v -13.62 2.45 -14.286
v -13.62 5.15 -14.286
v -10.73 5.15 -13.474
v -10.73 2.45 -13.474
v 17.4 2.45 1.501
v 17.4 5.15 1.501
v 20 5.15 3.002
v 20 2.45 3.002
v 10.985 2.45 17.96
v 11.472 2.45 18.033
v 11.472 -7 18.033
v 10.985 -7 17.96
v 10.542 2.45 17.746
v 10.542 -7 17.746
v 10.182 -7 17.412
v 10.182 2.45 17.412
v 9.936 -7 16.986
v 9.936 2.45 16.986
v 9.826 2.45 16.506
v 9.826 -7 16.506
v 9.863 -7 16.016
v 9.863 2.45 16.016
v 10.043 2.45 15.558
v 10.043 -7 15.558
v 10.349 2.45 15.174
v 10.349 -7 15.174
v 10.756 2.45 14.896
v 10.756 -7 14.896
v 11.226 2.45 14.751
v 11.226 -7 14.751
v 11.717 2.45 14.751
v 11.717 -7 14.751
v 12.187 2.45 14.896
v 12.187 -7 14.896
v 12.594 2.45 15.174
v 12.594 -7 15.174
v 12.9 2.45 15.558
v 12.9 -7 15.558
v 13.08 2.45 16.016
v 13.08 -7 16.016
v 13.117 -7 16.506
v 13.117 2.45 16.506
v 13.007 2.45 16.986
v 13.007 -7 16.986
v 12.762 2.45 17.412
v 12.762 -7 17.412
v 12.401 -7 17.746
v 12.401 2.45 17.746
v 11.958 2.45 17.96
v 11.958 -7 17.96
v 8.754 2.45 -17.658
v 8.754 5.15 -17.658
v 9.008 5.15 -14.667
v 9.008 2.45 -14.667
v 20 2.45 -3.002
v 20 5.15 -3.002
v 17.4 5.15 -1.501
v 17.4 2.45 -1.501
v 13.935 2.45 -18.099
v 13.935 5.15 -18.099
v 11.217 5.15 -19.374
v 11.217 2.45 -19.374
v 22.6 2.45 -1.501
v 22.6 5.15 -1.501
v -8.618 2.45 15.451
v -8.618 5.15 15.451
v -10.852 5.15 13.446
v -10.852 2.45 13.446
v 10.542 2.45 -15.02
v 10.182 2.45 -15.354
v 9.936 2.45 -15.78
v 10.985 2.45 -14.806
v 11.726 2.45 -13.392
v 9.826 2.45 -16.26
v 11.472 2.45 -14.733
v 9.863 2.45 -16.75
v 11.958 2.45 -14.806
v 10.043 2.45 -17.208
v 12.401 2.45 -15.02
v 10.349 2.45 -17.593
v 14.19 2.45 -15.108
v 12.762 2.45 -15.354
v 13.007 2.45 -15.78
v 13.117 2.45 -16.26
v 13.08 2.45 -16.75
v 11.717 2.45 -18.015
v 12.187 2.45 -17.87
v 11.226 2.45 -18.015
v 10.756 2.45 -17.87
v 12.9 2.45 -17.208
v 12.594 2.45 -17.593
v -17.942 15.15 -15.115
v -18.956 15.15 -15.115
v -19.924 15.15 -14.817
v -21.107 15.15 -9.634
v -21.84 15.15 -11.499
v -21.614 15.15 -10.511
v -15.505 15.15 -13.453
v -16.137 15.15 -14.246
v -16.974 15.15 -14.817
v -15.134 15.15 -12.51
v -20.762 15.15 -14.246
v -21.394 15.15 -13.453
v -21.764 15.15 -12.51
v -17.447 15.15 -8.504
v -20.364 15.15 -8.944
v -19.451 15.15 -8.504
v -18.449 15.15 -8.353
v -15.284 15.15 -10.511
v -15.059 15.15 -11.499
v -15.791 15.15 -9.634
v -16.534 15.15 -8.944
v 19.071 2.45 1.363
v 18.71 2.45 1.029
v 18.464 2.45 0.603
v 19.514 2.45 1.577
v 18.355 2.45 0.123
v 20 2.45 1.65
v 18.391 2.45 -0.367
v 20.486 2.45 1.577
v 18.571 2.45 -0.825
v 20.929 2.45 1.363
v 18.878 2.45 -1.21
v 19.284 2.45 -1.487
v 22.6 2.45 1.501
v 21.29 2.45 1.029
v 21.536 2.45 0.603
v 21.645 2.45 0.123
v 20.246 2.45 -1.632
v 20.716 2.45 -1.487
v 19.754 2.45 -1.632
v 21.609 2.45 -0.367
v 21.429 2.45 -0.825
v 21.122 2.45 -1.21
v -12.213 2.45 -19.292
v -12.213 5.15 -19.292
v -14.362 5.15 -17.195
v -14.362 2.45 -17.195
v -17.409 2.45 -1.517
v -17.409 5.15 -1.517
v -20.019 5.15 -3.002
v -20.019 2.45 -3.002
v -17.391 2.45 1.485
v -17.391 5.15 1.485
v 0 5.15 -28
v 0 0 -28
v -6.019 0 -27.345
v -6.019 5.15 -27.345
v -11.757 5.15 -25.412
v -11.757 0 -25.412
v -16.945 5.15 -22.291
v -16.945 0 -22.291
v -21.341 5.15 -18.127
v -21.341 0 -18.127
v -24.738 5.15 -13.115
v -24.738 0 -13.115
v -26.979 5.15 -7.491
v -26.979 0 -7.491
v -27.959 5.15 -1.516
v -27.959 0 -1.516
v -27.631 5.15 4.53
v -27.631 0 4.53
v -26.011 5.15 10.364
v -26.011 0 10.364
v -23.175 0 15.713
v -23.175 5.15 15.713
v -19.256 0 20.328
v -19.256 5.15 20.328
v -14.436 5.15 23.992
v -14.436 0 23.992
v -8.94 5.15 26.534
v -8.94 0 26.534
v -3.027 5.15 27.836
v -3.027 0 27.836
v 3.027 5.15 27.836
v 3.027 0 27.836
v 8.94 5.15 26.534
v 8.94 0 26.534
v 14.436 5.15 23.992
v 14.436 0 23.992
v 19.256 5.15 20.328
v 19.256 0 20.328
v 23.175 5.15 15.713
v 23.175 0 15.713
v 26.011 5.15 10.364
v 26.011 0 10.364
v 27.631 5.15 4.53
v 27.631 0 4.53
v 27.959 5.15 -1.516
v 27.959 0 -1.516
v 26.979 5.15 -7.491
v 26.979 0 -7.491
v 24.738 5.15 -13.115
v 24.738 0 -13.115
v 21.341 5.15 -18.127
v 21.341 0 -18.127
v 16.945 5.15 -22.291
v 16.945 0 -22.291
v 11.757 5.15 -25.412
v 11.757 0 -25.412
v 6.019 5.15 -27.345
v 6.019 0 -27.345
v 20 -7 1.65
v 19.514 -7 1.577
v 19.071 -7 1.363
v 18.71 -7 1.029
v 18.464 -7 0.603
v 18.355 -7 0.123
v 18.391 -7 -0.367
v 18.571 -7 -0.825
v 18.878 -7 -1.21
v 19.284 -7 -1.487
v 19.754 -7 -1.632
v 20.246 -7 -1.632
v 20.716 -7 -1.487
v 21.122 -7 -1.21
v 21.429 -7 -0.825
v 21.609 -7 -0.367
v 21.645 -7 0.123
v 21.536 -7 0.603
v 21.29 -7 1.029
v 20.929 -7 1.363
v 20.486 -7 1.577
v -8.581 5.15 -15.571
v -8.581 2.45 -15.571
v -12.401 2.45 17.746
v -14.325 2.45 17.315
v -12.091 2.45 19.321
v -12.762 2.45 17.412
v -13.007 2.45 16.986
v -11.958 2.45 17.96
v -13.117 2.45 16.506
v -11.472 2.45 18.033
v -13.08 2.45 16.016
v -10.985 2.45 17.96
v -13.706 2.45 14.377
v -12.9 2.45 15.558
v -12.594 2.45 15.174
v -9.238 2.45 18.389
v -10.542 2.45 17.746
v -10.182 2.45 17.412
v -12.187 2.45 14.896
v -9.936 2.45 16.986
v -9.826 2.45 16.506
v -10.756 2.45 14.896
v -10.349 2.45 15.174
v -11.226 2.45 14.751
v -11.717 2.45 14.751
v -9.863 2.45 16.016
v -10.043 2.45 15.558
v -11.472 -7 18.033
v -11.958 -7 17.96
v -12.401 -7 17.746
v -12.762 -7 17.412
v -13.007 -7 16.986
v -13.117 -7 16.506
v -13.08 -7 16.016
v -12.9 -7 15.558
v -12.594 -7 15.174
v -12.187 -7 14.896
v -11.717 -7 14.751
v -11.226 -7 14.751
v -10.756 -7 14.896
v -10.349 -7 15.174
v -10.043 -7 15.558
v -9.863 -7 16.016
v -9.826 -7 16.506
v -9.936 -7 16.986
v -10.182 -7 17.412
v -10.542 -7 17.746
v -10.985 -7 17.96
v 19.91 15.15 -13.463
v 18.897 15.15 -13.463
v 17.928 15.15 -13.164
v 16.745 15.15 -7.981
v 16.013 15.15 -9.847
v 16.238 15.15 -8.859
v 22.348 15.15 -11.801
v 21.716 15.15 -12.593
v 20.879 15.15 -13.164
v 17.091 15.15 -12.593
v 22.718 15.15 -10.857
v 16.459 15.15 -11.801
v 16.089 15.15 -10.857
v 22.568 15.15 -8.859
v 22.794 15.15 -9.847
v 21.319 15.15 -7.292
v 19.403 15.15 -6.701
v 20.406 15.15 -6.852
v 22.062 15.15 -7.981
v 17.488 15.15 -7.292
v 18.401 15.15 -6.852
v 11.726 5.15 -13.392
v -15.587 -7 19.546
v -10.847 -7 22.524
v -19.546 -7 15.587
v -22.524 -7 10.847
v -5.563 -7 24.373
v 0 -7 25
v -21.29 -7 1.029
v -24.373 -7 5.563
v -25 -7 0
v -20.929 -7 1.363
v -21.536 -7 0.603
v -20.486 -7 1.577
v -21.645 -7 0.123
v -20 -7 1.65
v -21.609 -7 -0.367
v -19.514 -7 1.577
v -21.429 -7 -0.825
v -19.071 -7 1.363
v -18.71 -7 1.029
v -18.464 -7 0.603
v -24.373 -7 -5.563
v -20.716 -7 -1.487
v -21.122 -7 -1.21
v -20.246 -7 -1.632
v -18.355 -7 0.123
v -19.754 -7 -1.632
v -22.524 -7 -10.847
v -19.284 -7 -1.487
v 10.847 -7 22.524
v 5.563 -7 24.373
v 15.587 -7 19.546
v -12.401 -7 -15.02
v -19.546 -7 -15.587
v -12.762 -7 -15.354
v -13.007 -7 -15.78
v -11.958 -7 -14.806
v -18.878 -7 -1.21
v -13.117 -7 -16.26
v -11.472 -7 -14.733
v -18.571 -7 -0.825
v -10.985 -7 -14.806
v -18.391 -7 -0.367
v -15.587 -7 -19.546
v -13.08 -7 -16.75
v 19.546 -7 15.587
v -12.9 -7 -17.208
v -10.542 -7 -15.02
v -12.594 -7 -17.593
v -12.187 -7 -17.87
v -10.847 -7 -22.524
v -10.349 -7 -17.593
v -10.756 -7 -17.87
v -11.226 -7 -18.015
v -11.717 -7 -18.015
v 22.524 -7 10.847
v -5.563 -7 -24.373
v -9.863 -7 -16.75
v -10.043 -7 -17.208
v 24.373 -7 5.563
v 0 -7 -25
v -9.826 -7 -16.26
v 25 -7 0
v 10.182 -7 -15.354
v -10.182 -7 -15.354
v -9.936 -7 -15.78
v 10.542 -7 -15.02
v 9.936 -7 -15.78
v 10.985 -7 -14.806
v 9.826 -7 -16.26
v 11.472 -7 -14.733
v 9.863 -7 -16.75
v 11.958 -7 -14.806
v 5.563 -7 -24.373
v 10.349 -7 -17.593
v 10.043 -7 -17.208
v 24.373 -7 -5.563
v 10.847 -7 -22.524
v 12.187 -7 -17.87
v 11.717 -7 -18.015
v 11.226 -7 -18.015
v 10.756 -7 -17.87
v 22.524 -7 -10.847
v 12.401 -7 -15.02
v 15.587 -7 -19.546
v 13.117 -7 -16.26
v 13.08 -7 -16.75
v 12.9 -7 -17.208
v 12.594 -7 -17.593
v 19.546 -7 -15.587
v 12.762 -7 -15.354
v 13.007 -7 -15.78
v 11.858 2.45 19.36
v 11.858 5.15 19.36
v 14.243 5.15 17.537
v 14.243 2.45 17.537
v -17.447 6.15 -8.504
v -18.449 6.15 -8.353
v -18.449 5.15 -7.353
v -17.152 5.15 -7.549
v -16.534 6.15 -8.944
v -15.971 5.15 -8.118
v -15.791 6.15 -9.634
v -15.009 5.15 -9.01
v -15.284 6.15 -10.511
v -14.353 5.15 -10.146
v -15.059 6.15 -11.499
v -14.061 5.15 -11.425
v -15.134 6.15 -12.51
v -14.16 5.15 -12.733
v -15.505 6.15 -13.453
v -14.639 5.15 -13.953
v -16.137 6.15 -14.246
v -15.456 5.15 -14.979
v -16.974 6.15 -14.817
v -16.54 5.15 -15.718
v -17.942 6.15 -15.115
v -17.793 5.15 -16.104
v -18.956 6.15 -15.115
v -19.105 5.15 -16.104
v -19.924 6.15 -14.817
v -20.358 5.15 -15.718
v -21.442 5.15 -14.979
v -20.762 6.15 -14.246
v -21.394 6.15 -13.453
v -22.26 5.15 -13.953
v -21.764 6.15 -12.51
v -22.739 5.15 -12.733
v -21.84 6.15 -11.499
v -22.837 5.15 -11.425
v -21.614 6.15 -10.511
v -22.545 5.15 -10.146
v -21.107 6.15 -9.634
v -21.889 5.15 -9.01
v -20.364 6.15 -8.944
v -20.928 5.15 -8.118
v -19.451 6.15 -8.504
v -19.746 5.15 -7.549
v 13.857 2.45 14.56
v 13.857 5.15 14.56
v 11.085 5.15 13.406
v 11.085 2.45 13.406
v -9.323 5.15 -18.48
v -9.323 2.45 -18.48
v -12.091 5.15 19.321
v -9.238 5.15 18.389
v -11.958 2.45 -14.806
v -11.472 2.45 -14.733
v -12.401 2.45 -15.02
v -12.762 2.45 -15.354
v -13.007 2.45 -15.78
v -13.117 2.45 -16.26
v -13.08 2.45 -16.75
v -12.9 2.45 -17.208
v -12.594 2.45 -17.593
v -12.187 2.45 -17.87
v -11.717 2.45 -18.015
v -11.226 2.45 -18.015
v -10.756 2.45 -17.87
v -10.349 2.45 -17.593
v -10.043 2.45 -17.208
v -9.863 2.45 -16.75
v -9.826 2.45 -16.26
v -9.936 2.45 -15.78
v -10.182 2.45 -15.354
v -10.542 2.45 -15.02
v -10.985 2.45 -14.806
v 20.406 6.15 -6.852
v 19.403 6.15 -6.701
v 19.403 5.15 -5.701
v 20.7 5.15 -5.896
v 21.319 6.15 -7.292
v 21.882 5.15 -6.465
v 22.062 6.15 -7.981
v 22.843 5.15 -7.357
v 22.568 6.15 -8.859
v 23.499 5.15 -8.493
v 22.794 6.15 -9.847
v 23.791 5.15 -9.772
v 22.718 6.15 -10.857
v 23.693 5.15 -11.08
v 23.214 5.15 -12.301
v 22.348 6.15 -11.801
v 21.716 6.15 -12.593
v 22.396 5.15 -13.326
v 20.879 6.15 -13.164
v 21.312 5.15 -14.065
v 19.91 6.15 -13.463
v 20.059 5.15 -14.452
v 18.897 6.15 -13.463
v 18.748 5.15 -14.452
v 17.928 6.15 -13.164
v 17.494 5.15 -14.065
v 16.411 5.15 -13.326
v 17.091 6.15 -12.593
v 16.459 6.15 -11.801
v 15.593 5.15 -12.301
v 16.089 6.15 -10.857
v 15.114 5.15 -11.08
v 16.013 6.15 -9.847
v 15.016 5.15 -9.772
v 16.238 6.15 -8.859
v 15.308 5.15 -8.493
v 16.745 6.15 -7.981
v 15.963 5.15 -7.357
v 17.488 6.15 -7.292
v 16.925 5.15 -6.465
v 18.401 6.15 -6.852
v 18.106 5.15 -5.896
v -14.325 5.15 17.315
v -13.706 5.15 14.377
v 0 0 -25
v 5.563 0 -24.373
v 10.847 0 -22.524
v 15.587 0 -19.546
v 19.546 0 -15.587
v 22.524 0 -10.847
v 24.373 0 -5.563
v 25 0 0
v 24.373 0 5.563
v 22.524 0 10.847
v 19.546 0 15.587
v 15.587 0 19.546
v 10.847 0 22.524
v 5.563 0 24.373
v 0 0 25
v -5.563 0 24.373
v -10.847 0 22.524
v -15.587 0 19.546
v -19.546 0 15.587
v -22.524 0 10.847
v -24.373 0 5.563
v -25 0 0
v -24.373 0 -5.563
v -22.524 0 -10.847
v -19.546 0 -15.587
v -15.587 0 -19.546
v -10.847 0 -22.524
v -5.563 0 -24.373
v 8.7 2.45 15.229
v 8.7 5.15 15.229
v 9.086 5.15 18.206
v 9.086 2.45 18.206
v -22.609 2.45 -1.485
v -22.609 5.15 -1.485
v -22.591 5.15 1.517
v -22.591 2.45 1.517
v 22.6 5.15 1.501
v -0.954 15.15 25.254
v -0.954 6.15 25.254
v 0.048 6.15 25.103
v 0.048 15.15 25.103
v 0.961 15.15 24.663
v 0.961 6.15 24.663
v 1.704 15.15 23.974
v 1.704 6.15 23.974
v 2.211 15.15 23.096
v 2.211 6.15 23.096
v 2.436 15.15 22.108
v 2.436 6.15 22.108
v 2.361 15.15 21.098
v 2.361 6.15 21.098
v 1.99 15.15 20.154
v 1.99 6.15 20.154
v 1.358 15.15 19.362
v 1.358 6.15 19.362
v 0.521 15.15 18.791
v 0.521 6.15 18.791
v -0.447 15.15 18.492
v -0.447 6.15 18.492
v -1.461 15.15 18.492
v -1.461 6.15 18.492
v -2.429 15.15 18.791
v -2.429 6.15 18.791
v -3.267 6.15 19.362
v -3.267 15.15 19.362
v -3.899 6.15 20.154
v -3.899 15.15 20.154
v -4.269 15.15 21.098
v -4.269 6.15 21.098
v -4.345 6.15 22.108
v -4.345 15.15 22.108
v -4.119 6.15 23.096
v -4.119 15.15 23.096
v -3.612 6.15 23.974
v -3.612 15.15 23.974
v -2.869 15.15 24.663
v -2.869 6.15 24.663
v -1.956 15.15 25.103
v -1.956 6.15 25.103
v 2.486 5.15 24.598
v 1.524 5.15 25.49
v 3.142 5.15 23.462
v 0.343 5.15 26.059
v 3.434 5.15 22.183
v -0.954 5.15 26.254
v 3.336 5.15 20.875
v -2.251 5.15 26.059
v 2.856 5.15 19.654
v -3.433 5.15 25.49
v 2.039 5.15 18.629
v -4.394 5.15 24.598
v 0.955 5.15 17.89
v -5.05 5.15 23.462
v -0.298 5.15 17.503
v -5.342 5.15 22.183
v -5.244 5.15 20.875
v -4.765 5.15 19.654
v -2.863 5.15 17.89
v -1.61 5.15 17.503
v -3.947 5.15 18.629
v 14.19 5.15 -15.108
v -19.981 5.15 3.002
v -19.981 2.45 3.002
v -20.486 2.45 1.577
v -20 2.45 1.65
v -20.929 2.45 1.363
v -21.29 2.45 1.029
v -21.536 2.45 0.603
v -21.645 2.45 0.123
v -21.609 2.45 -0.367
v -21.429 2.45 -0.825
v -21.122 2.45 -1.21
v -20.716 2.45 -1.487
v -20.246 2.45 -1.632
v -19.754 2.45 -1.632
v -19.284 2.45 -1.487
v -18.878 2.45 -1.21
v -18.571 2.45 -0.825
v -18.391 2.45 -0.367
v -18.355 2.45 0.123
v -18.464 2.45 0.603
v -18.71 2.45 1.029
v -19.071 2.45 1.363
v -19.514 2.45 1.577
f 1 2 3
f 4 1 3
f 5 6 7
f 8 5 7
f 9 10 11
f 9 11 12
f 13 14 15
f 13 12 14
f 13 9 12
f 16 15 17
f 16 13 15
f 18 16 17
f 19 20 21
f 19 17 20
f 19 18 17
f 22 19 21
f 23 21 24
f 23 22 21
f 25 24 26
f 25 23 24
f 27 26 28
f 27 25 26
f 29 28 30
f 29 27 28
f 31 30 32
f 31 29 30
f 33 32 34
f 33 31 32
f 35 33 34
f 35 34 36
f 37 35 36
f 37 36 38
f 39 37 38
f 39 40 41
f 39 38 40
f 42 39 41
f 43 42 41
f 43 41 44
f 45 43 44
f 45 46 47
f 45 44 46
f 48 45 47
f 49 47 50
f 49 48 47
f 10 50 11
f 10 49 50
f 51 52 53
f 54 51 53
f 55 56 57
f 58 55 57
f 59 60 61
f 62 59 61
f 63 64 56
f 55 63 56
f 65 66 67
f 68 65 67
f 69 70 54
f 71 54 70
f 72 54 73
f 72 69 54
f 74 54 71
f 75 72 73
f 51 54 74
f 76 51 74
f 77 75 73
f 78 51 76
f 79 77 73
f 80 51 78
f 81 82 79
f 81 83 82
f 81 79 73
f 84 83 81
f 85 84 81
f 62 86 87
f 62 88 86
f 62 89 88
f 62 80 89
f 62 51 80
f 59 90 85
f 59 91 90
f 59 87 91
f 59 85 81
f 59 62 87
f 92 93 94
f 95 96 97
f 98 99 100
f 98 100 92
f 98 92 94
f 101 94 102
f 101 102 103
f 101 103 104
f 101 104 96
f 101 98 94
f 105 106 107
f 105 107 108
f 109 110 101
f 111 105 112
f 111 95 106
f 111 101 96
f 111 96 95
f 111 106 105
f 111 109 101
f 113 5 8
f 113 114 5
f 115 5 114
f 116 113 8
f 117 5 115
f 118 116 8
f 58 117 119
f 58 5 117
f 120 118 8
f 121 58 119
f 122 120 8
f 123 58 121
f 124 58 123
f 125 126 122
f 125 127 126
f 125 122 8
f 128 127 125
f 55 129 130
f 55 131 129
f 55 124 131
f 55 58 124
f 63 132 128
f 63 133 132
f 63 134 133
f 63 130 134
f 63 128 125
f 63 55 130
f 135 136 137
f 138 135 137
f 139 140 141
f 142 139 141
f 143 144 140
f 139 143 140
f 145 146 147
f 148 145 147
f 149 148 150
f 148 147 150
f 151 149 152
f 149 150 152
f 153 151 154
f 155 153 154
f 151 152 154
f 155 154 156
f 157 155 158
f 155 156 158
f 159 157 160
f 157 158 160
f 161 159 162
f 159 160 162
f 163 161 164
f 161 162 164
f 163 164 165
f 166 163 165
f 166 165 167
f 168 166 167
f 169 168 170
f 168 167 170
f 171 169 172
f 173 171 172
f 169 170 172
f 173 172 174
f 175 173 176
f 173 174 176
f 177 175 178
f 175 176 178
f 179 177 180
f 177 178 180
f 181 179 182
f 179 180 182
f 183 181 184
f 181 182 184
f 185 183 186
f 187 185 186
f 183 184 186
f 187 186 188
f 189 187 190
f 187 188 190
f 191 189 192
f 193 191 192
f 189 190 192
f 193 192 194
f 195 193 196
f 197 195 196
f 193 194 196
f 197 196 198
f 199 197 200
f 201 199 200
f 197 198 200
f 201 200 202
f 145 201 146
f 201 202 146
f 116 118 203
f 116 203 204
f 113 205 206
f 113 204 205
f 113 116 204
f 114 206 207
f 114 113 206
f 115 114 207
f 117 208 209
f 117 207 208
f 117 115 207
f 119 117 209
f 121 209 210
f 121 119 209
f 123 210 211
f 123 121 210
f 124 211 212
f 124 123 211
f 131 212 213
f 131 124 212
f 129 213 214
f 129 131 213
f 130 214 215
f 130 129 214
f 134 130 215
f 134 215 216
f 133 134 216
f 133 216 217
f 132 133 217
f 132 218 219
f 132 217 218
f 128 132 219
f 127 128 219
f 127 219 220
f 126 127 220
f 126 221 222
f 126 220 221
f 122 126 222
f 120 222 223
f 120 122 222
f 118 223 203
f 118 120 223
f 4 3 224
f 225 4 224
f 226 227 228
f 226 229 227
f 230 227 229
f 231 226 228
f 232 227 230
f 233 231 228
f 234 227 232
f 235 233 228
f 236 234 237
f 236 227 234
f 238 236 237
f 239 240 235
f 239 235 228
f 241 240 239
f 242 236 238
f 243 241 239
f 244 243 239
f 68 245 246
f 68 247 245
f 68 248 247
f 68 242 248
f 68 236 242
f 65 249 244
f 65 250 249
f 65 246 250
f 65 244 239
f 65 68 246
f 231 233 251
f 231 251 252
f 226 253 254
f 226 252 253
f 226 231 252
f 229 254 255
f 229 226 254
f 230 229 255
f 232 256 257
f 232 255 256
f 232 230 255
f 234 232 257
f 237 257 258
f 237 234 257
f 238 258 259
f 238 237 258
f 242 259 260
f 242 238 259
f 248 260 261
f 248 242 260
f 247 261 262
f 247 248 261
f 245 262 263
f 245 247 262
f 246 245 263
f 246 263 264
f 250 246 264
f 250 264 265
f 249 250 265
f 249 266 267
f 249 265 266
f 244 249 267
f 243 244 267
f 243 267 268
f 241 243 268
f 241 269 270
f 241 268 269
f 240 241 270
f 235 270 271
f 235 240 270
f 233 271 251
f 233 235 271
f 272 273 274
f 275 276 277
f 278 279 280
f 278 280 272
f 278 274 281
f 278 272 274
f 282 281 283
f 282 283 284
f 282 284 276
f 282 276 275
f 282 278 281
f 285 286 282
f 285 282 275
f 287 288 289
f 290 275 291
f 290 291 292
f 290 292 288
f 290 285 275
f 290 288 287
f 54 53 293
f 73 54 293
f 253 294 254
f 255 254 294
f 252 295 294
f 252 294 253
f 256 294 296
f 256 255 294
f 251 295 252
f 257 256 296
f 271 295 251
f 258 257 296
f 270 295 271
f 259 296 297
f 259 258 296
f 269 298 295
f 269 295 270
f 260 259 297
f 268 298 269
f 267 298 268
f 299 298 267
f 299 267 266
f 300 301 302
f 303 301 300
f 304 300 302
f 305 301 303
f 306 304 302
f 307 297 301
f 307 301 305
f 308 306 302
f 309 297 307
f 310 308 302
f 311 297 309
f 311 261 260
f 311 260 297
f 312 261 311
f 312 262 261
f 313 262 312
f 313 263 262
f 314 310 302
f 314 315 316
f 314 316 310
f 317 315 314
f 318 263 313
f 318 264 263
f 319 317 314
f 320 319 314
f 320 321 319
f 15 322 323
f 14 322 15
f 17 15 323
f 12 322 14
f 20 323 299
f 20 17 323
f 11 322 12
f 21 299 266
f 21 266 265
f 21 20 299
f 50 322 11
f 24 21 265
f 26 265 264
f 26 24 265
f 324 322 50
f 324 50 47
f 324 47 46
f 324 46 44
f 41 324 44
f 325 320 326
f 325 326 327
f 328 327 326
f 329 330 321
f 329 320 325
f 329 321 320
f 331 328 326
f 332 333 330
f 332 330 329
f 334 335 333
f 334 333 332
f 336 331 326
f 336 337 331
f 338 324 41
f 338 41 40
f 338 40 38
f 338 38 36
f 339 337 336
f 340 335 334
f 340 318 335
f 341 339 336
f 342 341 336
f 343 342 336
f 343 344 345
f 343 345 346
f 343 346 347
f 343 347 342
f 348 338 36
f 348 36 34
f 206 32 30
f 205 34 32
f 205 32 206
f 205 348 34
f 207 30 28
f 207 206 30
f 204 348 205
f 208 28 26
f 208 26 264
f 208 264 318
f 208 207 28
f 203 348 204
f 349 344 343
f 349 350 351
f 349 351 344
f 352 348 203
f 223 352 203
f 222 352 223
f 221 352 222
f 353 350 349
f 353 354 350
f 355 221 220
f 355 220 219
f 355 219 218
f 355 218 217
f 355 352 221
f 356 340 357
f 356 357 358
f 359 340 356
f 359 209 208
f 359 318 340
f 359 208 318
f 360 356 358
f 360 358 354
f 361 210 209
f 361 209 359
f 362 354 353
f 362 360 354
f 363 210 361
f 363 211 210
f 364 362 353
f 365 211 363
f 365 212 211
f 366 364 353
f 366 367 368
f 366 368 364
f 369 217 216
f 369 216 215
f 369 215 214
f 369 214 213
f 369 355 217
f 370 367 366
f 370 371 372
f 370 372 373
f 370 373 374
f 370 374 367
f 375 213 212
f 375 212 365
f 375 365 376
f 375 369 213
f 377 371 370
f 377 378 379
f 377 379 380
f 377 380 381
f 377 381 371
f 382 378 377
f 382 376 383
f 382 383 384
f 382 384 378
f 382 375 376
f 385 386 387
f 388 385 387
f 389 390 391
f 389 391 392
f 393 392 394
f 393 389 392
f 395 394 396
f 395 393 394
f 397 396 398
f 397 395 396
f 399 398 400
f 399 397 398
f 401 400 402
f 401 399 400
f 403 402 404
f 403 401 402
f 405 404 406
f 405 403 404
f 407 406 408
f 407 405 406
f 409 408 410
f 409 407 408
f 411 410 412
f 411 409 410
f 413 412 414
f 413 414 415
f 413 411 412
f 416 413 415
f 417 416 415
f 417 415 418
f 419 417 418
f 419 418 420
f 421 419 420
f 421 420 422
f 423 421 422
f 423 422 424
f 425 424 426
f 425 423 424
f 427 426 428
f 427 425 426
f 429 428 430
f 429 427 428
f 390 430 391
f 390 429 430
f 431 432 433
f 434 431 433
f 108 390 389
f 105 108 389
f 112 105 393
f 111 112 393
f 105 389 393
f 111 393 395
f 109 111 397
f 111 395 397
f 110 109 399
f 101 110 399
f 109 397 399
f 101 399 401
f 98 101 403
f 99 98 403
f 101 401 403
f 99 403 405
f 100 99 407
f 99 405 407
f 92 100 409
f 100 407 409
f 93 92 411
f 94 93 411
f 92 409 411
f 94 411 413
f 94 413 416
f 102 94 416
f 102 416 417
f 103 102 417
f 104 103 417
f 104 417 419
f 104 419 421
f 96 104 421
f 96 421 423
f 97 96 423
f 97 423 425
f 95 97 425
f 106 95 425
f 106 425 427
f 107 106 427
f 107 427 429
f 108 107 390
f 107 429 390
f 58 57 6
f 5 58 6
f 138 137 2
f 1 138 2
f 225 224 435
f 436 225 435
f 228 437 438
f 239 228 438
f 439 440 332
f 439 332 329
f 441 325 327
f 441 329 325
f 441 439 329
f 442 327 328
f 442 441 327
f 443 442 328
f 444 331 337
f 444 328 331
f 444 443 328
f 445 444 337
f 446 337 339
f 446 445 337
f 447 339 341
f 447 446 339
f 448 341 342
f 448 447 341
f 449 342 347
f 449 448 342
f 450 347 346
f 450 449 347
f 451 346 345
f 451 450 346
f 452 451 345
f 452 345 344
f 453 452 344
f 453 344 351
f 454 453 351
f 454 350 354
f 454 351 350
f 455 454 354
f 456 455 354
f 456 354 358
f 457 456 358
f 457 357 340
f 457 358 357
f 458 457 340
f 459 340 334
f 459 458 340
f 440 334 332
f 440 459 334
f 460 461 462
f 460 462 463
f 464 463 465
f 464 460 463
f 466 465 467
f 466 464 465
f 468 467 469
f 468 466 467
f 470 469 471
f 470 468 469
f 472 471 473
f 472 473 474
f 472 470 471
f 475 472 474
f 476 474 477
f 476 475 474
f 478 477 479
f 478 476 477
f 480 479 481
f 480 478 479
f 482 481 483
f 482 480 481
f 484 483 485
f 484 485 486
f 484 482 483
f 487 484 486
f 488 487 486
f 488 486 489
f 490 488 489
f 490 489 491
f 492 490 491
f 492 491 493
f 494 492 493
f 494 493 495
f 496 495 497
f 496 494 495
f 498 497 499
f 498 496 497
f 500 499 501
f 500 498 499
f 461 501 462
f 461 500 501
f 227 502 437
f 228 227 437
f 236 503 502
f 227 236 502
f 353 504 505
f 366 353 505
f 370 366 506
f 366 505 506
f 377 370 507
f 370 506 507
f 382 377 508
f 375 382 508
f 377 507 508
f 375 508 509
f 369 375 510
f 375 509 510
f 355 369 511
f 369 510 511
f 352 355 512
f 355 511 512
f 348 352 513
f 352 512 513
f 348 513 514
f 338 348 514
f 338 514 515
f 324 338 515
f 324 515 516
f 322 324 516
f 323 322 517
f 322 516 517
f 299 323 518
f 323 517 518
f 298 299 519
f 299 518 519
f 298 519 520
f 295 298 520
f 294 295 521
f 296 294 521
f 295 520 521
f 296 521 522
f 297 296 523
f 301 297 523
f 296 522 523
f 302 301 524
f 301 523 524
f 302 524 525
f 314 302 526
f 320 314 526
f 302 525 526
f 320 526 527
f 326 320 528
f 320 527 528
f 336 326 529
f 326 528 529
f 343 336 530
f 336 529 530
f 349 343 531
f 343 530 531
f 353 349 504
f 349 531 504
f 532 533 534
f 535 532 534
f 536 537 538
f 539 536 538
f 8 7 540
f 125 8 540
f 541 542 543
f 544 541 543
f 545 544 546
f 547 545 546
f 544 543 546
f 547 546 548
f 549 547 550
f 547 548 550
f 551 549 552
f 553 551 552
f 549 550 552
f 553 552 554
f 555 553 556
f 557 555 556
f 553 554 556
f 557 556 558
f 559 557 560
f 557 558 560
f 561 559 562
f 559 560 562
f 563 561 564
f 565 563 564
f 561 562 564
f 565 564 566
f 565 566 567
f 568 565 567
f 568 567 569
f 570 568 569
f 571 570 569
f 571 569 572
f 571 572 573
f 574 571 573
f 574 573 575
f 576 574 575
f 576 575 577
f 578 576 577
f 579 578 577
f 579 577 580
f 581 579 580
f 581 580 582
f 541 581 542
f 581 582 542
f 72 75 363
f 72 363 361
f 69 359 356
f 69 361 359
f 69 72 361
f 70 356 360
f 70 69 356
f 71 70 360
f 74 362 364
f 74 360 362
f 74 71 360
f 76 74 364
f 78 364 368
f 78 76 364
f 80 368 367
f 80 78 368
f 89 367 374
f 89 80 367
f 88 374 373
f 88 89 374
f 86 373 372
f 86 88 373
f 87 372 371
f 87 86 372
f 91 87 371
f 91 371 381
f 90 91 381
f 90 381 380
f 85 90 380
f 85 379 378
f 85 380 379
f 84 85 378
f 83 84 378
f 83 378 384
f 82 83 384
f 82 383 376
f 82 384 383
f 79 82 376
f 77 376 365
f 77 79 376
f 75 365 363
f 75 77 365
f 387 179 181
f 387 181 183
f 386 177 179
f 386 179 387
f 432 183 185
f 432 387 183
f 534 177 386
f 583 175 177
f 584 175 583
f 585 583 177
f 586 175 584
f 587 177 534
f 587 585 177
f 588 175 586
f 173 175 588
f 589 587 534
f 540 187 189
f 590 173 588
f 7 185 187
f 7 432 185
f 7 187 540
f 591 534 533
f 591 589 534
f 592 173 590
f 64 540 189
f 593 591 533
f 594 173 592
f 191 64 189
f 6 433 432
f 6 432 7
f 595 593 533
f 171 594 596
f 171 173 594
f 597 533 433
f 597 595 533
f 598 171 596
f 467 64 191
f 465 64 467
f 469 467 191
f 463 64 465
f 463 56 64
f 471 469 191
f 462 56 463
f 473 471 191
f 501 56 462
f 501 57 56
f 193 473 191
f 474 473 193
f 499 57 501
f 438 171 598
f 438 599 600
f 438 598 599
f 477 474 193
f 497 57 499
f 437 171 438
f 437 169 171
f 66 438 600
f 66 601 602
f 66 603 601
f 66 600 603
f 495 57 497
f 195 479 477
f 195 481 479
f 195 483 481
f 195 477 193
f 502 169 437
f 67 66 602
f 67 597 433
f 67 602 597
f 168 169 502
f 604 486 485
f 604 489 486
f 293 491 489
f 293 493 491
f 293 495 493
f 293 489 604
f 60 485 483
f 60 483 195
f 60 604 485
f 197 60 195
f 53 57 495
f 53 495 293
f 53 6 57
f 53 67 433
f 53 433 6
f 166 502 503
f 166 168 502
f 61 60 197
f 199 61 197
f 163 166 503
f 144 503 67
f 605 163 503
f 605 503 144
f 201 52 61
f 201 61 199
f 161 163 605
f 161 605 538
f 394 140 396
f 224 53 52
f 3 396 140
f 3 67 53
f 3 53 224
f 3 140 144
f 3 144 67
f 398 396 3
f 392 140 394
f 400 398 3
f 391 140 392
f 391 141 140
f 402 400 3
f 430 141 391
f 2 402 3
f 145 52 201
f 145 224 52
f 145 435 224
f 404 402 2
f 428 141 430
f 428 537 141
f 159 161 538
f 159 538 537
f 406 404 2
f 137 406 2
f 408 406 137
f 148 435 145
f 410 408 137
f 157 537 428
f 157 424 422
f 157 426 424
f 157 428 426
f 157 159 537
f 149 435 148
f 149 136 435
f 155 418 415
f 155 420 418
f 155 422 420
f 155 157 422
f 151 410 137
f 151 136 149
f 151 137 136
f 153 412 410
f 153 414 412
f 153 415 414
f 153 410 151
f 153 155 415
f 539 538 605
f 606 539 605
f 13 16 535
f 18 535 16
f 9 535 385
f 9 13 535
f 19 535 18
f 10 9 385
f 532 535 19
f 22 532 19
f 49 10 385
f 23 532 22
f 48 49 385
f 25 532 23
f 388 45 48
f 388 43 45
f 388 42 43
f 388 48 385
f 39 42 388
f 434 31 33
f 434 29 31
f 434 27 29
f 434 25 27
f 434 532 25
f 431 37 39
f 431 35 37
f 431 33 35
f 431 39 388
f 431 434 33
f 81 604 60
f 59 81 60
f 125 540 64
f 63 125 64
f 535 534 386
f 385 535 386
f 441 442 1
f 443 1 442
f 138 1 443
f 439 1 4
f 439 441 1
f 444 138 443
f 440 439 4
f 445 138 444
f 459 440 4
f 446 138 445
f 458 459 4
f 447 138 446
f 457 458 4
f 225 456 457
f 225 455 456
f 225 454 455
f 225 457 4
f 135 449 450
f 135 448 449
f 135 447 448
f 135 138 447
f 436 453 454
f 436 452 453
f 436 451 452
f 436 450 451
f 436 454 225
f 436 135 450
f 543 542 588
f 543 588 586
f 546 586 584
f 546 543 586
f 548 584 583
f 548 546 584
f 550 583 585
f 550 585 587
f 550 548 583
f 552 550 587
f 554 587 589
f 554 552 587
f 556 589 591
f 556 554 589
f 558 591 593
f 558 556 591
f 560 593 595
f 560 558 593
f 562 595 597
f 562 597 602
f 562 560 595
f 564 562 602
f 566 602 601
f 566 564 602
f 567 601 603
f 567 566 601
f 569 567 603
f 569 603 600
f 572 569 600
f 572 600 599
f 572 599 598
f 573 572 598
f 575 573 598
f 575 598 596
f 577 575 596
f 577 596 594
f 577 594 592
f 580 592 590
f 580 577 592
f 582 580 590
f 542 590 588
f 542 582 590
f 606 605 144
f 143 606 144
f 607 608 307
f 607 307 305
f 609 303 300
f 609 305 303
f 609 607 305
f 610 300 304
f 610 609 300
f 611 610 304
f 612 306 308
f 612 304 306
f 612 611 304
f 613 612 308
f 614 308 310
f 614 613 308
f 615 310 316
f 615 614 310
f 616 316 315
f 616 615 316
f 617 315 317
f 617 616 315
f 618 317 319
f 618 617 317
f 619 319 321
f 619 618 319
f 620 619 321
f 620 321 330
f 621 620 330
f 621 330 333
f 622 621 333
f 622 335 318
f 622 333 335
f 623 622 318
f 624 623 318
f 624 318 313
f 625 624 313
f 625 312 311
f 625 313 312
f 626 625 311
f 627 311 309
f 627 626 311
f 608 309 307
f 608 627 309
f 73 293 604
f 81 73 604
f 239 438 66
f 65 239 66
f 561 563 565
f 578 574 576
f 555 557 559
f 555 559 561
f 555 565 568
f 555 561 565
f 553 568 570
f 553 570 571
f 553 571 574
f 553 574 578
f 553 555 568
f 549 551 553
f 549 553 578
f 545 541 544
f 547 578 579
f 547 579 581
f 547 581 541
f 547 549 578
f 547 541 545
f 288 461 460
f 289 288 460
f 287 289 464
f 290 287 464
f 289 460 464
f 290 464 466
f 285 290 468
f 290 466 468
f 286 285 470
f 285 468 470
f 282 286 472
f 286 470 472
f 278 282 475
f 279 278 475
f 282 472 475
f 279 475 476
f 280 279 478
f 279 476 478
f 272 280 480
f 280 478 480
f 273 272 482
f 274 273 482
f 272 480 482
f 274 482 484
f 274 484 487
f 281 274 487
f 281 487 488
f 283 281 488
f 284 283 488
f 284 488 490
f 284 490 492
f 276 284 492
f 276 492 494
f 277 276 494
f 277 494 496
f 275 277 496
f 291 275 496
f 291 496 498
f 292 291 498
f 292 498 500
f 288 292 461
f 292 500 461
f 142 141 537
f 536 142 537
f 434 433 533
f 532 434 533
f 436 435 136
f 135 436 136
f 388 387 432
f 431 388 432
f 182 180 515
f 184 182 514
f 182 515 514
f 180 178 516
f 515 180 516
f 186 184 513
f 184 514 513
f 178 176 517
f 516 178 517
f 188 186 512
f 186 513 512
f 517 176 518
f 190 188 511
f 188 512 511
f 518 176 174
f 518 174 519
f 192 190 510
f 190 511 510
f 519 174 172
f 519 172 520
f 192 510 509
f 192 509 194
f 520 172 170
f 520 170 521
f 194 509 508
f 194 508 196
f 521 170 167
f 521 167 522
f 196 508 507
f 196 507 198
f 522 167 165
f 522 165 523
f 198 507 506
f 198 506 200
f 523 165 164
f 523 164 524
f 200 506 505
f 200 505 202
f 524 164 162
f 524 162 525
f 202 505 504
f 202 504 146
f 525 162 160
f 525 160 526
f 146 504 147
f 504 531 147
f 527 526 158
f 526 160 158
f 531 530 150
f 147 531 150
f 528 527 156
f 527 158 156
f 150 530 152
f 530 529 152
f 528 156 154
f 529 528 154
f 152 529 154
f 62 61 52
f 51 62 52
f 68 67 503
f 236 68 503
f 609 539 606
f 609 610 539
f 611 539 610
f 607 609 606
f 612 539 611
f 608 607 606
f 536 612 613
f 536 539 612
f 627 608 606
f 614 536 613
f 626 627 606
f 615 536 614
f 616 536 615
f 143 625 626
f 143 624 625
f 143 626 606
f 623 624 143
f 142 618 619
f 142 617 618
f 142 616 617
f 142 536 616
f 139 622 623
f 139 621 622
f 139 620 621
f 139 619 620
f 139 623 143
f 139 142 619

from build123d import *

# Parameters (mm, degrees)
SKETCH3_R               = 28
BOSS_EXTRUDE1_DEPTH     = 5.15
SKETCH6_R               = 25
BOSS_EXTRUDE4_DEPTH     = 7
SKETCH7_R               = 3.4
BOSS_EXTRUDE5_DEPTH     = 10
CUT_EXTRUDE1_DEPTH      = 10
CUT_EXTRUDE1_DEPTH_BACK = 43.3971992
SKETCH8_R               = 1.65
CUT_EXTRUDE3_DEPTH      = 2.7
CHAMFER1_SIZE           = 1


with BuildPart() as part:
    # Sketch3 → Boss-Extrude1 (new body)
    with BuildSketch(Plane(origin=(0, 0, 0), x_dir=(1, 0, 0), z_dir=(0, 1, 0))):
        with Locations(Location((0, 0, 0), (0, 0, 90))):
            Circle(SKETCH3_R)
    extrude(amount=BOSS_EXTRUDE1_DEPTH)

    # Sketch6 → Boss-Extrude4 (add)
    with BuildSketch(Plane.XZ):
        with Locations(Location((0, 0, 0), (0, 0, 270))):
            Circle(SKETCH6_R)
    extrude(amount=BOSS_EXTRUDE4_DEPTH)

    # Sketch7 → Boss-Extrude5 (add)
    with BuildSketch(Plane(origin=(0, 5.15, 0), x_dir=(1, 0, 0), z_dir=(0, 1, 0))):
        with Locations(Location((-0.954174099, -21.854179847, 0), (0, 0, 270))):
            Circle(SKETCH7_R)
        with Locations(Location((-18.449187877, 11.753428933, 0), (0, 0, 270))):
            Circle(SKETCH7_R)
        with Locations(Location((19.403361976, 10.100750915, 0), (0, 0, 270))):
            Circle(SKETCH7_R)
    extrude(amount=BOSS_EXTRUDE5_DEPTH)

    # Sketch8 → Cut-Extrude1 (cut, two sides: drawn at the far end of the back side and taken through both)
    with BuildSketch(Plane.XZ.offset(-CUT_EXTRUDE1_DEPTH_BACK)):
        with Locations(Location((20, 0, 0), (0, 0, 90))):
            Circle(SKETCH8_R)
        with Locations(Location((-20, 0, 0), (0, 0, 90))):
            Circle(SKETCH8_R)
        with Locations(Location((11.471528727, 16.383040886, 0), (0, 0, 90))):
            Circle(SKETCH8_R)
        with Locations(Location((-11.471528727, -16.383040886, 0), (0, 0, 90))):
            Circle(SKETCH8_R)
        with Locations(Location((11.471528727, -16.383040886, 0), (0, 0, 90))):
            Circle(SKETCH8_R)
        with Locations(Location((-11.471528727, 16.383040886, 0), (0, 0, 90))):
            Circle(SKETCH8_R)
    extrude(amount=CUT_EXTRUDE1_DEPTH + CUT_EXTRUDE1_DEPTH_BACK, mode=Mode.SUBTRACT)

    # Sketch11 → Cut-Extrude3 (cut)
    with BuildSketch(Plane(origin=(0, 5.15, 0), x_dir=(1, 0, 0), z_dir=(0, 1, 0))):
        Polygon((11.858091258, -19.360271603), (14.243167426, -17.536883273), (13.856604896, -14.559652555), (11.084966196, -13.405810169), (8.699890028, -15.229198499), (9.086452558, -18.206429216), align=None)
        Polygon((-12.091418901, -19.320568674), (-9.237500125, -18.388645418), (-8.617609951, -15.45111763), (-10.851638553, -13.445513098), (-13.705557329, -14.377436353), (-14.325447503, -17.314964141), align=None)
        Polygon((-22.590586111, -1.517299224), (-19.981273382, -3.002162995), (-17.390687271, -1.48486377), (-17.409413889, 1.517299224), (-20.018726618, 3.002162995), (-22.609312729, 1.48486377), align=None)
        Polygon((20, -3.0022214), (22.6, -1.5011107), (22.6, 1.5011107), (20, 3.0022214), (17.4, 1.5011107), (17.4, -1.5011107), align=None)
        Polygon((9.008253879, 14.666762832), (11.726231698, 13.391643264), (14.189506546, 15.107921318), (13.934803575, 18.09931894), (11.216825756, 19.374438507), (8.753550908, 17.658160453), align=None)
        Polygon((-10.729703857, 13.473912288), (-8.581237024, 15.57091577), (-9.323061894, 18.480044367), (-12.213353597, 19.292169483), (-14.36182043, 17.195166002), (-13.61999556, 14.286037405), align=None)
    extrude(amount=-CUT_EXTRUDE3_DEPTH, mode=Mode.SUBTRACT)

    # Chamfer1
    chamfer1_edges = [part.edges().sort_by_distance(p)[0] for p in [
        (-18.449187877, 5.15, -15.153428933),
        (-0.954174099, 5.15, 18.454179847),
        (19.403361976, 5.15, -13.500750915),
    ]]
    chamfer(chamfer1_edges, length=CHAMFER1_SIZE)


solid = part.part
